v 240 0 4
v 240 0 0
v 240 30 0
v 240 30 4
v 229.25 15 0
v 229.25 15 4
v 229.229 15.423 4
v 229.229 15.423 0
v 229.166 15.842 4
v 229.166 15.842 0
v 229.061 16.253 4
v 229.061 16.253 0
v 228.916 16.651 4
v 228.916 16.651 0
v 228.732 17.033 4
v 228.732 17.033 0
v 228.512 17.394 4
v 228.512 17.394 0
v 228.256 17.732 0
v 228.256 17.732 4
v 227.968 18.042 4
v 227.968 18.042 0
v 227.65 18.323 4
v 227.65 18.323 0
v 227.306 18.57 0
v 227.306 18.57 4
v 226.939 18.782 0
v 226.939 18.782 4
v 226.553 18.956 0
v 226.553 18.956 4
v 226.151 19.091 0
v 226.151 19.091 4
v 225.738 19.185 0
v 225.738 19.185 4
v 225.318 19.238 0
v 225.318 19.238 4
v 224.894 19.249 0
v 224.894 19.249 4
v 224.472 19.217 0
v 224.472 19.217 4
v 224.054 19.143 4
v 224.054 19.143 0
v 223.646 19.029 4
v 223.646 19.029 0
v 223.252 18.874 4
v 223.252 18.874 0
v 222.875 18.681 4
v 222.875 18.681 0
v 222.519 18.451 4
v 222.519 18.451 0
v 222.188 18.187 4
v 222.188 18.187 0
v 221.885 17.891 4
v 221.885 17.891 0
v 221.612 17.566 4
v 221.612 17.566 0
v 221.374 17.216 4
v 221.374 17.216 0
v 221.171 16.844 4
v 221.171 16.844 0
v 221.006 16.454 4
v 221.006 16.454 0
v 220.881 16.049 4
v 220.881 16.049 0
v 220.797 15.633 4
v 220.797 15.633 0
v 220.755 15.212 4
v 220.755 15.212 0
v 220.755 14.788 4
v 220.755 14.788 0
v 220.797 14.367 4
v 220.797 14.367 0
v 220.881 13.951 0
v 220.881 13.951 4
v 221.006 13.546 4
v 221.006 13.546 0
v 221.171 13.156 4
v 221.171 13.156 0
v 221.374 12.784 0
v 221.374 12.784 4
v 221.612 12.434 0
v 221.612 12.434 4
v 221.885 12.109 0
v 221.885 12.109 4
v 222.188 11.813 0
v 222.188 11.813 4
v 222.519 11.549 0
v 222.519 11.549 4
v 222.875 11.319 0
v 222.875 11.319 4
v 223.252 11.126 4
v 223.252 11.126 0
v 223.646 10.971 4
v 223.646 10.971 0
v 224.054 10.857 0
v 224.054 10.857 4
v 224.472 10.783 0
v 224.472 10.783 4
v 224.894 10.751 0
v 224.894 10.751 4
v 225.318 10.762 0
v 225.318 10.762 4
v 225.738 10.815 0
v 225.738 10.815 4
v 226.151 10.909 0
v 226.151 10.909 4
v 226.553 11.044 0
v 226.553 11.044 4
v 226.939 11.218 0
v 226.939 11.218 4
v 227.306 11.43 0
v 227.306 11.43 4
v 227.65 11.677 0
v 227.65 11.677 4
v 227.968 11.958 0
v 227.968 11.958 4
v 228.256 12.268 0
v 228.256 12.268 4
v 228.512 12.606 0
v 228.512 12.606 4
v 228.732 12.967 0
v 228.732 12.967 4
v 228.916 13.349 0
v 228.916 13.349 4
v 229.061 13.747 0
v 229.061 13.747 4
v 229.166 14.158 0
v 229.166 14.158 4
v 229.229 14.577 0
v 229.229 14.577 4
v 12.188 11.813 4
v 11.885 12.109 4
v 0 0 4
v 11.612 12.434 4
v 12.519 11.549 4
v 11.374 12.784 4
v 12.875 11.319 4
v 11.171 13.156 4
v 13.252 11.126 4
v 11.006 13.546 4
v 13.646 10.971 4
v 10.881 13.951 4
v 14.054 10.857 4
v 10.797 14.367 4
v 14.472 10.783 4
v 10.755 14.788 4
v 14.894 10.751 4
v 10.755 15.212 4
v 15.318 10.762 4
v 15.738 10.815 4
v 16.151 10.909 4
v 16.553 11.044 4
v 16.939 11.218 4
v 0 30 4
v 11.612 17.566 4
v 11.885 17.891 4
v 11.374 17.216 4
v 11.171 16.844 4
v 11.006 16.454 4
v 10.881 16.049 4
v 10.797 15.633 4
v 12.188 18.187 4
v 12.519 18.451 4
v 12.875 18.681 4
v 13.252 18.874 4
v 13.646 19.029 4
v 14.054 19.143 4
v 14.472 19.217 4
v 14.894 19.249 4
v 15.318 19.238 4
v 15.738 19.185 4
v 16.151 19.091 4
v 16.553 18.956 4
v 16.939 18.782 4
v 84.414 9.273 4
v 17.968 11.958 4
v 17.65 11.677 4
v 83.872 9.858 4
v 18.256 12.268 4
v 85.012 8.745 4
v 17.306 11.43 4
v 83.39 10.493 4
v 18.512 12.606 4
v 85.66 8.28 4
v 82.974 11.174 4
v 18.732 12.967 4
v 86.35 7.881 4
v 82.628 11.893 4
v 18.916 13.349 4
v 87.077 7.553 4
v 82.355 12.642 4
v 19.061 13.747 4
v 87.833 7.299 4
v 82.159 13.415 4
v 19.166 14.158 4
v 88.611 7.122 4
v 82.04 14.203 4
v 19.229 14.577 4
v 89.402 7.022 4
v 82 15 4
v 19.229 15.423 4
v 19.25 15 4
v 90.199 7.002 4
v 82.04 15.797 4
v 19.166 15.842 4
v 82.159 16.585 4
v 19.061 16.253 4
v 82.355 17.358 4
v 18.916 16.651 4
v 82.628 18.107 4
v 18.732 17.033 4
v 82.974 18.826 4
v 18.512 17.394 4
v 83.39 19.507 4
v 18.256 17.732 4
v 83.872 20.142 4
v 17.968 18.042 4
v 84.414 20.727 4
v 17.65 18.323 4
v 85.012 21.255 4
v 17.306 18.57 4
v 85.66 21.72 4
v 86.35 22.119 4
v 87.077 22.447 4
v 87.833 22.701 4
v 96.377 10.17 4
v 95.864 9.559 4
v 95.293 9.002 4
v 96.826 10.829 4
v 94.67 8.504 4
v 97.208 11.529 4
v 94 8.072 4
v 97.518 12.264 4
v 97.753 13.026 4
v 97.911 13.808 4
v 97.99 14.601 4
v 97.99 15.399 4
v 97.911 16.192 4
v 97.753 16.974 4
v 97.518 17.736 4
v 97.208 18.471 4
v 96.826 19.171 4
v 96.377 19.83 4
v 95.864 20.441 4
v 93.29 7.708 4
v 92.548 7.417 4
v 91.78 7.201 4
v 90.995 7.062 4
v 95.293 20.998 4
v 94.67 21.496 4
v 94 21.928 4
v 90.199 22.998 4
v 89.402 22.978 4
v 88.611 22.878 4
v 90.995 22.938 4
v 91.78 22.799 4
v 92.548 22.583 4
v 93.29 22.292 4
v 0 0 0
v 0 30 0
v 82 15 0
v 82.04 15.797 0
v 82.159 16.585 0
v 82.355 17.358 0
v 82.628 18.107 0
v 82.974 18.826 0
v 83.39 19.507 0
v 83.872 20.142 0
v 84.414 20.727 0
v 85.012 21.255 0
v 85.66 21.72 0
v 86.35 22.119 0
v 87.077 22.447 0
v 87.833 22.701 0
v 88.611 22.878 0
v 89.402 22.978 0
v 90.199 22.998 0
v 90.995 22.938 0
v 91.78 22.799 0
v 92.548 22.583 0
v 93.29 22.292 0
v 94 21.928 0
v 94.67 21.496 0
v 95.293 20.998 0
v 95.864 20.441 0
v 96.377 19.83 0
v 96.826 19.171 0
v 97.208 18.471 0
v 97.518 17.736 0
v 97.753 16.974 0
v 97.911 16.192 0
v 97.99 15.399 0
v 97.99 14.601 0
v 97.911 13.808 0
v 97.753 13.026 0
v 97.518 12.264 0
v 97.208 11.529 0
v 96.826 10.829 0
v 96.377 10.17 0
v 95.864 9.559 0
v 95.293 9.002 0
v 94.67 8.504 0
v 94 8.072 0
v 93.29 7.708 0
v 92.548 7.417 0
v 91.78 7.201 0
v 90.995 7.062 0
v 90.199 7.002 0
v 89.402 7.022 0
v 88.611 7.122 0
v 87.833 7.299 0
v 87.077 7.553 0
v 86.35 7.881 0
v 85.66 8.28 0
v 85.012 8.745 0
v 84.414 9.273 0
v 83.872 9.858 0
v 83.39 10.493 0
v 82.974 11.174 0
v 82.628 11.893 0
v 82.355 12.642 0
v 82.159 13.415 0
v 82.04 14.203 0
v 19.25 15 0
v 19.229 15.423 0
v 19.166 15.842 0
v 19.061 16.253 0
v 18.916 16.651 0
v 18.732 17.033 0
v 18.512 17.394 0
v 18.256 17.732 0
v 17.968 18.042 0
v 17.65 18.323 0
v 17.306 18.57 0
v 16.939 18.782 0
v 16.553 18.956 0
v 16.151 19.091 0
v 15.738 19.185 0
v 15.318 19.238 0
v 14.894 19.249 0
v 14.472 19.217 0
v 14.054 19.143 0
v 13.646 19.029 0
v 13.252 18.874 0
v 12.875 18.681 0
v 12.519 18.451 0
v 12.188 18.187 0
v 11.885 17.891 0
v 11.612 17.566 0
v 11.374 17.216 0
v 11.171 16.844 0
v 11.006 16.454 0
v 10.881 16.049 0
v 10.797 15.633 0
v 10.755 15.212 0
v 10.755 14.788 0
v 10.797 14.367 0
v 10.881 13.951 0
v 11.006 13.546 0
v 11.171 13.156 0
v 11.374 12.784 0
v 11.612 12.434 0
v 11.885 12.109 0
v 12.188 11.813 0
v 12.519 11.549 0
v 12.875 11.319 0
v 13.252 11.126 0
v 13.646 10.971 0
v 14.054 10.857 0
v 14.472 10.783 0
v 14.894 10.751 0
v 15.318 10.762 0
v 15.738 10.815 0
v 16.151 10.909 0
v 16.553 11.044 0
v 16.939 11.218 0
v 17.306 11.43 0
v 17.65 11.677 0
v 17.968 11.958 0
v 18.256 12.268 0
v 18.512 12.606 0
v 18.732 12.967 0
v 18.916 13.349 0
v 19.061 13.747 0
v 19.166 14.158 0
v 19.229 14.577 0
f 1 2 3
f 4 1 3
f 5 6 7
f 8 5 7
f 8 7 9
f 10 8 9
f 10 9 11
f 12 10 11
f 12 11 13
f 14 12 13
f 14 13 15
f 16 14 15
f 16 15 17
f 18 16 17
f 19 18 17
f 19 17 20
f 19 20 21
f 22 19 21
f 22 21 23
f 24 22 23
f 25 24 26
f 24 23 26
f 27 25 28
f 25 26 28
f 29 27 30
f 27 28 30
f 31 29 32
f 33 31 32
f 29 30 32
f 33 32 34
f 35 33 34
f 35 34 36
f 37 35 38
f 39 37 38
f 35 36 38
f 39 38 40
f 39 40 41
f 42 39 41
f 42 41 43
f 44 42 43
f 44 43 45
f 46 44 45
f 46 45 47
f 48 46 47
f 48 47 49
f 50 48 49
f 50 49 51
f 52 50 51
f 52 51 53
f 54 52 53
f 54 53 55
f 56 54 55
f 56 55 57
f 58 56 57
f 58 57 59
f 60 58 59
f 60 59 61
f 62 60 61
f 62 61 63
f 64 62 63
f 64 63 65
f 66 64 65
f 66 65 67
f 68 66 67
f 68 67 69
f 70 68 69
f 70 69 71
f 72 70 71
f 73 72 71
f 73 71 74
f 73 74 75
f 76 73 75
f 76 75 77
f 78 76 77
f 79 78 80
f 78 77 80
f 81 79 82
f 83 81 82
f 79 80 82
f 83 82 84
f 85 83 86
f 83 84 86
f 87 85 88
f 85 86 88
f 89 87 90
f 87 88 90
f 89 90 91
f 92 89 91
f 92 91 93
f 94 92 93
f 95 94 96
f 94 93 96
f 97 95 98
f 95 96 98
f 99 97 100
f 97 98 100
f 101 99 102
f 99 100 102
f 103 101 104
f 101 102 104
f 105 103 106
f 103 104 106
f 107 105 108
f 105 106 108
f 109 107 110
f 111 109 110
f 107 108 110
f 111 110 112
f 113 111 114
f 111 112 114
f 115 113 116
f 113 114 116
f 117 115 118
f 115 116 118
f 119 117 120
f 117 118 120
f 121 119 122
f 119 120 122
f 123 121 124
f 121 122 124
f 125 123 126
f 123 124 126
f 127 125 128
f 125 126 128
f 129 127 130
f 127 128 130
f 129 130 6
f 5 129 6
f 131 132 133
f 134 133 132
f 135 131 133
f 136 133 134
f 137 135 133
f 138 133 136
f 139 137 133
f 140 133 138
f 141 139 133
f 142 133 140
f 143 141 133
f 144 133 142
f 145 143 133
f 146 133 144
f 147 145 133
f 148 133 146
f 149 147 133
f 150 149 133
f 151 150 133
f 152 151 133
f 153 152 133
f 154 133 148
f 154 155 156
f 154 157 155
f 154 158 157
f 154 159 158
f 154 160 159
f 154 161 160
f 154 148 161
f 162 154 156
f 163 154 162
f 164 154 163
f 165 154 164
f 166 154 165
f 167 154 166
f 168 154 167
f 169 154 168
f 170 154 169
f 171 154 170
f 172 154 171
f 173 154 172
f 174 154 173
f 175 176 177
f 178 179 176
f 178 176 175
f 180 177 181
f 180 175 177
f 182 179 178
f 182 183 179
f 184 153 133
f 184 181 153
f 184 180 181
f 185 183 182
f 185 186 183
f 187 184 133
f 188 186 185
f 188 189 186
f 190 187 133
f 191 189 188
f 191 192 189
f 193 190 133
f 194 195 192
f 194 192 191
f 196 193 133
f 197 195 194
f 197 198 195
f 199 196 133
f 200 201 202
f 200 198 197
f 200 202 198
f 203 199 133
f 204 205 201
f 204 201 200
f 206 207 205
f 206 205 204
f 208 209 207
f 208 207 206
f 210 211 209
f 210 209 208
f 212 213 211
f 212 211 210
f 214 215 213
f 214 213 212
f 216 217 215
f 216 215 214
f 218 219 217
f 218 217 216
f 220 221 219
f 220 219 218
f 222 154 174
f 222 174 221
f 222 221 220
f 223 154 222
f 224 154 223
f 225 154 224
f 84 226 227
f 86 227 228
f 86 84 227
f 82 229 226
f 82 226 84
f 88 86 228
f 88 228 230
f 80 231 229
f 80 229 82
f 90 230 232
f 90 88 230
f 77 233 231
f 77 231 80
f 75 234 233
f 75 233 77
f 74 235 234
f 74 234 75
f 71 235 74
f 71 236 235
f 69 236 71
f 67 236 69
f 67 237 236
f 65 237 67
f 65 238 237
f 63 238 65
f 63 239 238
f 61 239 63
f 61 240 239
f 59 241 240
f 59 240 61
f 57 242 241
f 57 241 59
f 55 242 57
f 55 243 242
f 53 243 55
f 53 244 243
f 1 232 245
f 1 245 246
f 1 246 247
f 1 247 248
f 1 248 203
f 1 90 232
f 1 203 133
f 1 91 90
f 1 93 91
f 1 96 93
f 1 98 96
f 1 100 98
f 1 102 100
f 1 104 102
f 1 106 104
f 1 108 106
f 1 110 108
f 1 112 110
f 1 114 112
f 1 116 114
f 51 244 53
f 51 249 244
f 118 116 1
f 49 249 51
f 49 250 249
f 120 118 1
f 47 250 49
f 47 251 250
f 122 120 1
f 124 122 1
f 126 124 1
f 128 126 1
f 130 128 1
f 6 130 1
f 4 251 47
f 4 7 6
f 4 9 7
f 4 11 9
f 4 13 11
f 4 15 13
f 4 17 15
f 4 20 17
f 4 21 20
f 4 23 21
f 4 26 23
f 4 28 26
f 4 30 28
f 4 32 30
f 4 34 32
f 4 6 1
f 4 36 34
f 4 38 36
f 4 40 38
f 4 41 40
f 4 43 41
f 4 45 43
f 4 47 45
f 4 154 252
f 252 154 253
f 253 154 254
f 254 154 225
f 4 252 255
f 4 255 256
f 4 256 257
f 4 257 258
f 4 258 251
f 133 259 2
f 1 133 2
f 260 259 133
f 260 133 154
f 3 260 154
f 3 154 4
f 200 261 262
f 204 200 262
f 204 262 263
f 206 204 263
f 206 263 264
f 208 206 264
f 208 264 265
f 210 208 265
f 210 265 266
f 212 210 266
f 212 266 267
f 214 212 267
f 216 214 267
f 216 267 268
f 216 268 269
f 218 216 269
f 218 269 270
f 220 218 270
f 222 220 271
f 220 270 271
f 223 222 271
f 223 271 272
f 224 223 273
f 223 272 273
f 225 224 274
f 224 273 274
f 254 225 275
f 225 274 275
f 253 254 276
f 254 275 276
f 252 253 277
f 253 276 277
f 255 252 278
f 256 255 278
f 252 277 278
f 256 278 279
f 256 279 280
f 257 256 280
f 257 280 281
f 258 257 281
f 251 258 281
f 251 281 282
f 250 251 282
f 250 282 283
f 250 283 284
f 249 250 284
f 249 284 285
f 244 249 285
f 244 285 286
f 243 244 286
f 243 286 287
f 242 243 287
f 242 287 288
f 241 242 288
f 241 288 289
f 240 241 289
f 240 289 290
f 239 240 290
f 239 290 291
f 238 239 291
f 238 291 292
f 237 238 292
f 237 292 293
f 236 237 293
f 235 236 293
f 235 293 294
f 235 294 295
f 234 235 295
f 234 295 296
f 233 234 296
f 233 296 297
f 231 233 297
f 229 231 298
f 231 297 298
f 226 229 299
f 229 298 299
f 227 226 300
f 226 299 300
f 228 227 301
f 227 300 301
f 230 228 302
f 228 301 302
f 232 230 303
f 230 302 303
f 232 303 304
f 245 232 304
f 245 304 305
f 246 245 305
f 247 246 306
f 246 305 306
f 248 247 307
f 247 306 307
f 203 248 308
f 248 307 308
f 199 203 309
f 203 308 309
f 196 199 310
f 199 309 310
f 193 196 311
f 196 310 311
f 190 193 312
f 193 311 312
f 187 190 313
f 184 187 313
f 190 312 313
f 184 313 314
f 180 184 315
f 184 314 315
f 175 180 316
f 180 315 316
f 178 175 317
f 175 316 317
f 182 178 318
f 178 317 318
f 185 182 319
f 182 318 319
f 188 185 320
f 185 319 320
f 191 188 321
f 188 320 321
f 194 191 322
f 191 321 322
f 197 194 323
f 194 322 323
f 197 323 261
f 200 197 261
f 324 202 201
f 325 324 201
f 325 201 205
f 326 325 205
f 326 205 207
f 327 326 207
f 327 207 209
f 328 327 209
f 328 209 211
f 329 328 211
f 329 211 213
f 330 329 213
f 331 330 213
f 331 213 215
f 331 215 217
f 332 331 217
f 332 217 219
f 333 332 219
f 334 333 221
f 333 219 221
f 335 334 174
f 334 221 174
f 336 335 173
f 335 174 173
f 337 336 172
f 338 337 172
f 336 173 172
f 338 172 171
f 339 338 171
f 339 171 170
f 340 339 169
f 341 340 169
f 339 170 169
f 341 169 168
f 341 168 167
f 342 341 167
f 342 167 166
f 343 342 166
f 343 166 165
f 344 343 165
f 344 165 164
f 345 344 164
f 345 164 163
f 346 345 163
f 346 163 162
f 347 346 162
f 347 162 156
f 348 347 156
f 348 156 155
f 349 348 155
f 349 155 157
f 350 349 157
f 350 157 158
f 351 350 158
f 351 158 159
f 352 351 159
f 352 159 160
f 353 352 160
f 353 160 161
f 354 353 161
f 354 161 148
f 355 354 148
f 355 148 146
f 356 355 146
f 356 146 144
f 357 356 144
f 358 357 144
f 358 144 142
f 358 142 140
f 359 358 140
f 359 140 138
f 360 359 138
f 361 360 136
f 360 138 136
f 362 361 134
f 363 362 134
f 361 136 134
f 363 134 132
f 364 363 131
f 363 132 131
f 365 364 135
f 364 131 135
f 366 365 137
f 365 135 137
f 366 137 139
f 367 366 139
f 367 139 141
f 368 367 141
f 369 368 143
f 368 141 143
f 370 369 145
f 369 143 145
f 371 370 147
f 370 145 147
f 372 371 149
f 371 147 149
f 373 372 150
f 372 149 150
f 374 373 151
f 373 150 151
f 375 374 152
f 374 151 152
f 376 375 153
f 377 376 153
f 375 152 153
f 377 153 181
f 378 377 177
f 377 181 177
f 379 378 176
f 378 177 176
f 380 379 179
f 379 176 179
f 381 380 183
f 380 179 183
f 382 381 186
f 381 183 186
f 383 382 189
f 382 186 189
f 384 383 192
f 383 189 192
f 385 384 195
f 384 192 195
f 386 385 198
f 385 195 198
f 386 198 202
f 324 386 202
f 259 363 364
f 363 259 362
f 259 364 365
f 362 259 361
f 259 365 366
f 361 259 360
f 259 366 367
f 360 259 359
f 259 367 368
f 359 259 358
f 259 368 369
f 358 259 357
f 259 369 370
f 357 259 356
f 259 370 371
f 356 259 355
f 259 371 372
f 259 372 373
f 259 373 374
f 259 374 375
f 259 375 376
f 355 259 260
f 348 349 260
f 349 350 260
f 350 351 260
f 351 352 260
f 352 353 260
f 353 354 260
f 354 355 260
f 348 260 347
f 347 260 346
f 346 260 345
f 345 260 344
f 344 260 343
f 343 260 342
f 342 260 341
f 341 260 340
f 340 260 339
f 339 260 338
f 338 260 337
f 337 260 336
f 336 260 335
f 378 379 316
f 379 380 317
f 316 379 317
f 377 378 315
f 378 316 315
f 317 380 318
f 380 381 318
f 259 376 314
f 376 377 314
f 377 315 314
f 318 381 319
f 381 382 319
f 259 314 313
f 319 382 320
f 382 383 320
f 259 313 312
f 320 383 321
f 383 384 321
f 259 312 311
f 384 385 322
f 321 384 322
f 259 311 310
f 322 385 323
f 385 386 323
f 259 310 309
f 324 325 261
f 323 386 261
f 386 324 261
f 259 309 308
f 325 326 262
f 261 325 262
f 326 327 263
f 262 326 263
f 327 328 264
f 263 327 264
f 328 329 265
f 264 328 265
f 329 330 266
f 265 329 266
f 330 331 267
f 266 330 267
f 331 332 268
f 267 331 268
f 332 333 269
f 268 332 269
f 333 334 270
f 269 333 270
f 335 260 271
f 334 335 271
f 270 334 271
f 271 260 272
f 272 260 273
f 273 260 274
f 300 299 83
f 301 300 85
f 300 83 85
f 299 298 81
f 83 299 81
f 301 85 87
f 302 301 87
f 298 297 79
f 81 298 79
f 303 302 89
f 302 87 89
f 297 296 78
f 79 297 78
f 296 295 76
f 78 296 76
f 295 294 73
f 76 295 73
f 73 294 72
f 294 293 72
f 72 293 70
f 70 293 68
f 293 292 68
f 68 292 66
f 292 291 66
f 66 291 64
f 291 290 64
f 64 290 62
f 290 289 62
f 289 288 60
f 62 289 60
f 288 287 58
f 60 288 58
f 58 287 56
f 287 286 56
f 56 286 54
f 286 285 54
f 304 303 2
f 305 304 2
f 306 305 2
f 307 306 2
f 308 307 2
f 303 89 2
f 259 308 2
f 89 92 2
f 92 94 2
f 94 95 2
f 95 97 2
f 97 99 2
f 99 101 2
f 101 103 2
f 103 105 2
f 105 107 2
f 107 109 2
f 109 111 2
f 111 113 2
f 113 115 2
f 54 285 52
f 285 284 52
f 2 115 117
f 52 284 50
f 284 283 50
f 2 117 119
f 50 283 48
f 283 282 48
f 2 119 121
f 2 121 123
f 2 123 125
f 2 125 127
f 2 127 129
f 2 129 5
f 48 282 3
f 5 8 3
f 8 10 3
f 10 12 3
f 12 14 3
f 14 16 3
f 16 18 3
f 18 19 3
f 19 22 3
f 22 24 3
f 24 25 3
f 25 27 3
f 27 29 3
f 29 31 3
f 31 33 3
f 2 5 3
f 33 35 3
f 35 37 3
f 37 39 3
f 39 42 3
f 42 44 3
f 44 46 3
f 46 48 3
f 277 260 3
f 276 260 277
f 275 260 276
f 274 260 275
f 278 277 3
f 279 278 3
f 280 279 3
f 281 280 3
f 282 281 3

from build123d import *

# Parameters (mm, degrees)
SKETCH1_W           = 240
SKETCH1_H           = 30
BOSS_EXTRUDE1_DEPTH = 4
SKETCH2_R           = 4.25
CUT_EXTRUDE1_DEPTH  = 242.900806117
SKETCH3_R           = 8
CUT_EXTRUDE2_DEPTH  = 242.900806117


with BuildPart() as part:
    # Sketch1 → Boss-Extrude1 (new body)
    with BuildSketch(Plane.XY):
        with Locations((120, 15)):
            Rectangle(SKETCH1_W, SKETCH1_H)
    extrude(amount=BOSS_EXTRUDE1_DEPTH)

    # Sketch2 → Cut-Extrude1 (cut, through all)
    with BuildSketch(Plane.XY.offset(4)):
        with Locations((225, 15)):
            Circle(SKETCH2_R)
        with Locations((15, 15)):
            Circle(SKETCH2_R)
    extrude(amount=-CUT_EXTRUDE1_DEPTH, mode=Mode.SUBTRACT)

    # Sketch3 → Cut-Extrude2 (cut, through all)
    with BuildSketch(Plane(origin=(0, 0, 0), x_dir=(-1, 0, 0), z_dir=(0, 0, -1))):
        with Locations((-90, 15)):
            Circle(SKETCH3_R)
    extrude(amount=-CUT_EXTRUDE2_DEPTH, mode=Mode.SUBTRACT)


solid = part.part
